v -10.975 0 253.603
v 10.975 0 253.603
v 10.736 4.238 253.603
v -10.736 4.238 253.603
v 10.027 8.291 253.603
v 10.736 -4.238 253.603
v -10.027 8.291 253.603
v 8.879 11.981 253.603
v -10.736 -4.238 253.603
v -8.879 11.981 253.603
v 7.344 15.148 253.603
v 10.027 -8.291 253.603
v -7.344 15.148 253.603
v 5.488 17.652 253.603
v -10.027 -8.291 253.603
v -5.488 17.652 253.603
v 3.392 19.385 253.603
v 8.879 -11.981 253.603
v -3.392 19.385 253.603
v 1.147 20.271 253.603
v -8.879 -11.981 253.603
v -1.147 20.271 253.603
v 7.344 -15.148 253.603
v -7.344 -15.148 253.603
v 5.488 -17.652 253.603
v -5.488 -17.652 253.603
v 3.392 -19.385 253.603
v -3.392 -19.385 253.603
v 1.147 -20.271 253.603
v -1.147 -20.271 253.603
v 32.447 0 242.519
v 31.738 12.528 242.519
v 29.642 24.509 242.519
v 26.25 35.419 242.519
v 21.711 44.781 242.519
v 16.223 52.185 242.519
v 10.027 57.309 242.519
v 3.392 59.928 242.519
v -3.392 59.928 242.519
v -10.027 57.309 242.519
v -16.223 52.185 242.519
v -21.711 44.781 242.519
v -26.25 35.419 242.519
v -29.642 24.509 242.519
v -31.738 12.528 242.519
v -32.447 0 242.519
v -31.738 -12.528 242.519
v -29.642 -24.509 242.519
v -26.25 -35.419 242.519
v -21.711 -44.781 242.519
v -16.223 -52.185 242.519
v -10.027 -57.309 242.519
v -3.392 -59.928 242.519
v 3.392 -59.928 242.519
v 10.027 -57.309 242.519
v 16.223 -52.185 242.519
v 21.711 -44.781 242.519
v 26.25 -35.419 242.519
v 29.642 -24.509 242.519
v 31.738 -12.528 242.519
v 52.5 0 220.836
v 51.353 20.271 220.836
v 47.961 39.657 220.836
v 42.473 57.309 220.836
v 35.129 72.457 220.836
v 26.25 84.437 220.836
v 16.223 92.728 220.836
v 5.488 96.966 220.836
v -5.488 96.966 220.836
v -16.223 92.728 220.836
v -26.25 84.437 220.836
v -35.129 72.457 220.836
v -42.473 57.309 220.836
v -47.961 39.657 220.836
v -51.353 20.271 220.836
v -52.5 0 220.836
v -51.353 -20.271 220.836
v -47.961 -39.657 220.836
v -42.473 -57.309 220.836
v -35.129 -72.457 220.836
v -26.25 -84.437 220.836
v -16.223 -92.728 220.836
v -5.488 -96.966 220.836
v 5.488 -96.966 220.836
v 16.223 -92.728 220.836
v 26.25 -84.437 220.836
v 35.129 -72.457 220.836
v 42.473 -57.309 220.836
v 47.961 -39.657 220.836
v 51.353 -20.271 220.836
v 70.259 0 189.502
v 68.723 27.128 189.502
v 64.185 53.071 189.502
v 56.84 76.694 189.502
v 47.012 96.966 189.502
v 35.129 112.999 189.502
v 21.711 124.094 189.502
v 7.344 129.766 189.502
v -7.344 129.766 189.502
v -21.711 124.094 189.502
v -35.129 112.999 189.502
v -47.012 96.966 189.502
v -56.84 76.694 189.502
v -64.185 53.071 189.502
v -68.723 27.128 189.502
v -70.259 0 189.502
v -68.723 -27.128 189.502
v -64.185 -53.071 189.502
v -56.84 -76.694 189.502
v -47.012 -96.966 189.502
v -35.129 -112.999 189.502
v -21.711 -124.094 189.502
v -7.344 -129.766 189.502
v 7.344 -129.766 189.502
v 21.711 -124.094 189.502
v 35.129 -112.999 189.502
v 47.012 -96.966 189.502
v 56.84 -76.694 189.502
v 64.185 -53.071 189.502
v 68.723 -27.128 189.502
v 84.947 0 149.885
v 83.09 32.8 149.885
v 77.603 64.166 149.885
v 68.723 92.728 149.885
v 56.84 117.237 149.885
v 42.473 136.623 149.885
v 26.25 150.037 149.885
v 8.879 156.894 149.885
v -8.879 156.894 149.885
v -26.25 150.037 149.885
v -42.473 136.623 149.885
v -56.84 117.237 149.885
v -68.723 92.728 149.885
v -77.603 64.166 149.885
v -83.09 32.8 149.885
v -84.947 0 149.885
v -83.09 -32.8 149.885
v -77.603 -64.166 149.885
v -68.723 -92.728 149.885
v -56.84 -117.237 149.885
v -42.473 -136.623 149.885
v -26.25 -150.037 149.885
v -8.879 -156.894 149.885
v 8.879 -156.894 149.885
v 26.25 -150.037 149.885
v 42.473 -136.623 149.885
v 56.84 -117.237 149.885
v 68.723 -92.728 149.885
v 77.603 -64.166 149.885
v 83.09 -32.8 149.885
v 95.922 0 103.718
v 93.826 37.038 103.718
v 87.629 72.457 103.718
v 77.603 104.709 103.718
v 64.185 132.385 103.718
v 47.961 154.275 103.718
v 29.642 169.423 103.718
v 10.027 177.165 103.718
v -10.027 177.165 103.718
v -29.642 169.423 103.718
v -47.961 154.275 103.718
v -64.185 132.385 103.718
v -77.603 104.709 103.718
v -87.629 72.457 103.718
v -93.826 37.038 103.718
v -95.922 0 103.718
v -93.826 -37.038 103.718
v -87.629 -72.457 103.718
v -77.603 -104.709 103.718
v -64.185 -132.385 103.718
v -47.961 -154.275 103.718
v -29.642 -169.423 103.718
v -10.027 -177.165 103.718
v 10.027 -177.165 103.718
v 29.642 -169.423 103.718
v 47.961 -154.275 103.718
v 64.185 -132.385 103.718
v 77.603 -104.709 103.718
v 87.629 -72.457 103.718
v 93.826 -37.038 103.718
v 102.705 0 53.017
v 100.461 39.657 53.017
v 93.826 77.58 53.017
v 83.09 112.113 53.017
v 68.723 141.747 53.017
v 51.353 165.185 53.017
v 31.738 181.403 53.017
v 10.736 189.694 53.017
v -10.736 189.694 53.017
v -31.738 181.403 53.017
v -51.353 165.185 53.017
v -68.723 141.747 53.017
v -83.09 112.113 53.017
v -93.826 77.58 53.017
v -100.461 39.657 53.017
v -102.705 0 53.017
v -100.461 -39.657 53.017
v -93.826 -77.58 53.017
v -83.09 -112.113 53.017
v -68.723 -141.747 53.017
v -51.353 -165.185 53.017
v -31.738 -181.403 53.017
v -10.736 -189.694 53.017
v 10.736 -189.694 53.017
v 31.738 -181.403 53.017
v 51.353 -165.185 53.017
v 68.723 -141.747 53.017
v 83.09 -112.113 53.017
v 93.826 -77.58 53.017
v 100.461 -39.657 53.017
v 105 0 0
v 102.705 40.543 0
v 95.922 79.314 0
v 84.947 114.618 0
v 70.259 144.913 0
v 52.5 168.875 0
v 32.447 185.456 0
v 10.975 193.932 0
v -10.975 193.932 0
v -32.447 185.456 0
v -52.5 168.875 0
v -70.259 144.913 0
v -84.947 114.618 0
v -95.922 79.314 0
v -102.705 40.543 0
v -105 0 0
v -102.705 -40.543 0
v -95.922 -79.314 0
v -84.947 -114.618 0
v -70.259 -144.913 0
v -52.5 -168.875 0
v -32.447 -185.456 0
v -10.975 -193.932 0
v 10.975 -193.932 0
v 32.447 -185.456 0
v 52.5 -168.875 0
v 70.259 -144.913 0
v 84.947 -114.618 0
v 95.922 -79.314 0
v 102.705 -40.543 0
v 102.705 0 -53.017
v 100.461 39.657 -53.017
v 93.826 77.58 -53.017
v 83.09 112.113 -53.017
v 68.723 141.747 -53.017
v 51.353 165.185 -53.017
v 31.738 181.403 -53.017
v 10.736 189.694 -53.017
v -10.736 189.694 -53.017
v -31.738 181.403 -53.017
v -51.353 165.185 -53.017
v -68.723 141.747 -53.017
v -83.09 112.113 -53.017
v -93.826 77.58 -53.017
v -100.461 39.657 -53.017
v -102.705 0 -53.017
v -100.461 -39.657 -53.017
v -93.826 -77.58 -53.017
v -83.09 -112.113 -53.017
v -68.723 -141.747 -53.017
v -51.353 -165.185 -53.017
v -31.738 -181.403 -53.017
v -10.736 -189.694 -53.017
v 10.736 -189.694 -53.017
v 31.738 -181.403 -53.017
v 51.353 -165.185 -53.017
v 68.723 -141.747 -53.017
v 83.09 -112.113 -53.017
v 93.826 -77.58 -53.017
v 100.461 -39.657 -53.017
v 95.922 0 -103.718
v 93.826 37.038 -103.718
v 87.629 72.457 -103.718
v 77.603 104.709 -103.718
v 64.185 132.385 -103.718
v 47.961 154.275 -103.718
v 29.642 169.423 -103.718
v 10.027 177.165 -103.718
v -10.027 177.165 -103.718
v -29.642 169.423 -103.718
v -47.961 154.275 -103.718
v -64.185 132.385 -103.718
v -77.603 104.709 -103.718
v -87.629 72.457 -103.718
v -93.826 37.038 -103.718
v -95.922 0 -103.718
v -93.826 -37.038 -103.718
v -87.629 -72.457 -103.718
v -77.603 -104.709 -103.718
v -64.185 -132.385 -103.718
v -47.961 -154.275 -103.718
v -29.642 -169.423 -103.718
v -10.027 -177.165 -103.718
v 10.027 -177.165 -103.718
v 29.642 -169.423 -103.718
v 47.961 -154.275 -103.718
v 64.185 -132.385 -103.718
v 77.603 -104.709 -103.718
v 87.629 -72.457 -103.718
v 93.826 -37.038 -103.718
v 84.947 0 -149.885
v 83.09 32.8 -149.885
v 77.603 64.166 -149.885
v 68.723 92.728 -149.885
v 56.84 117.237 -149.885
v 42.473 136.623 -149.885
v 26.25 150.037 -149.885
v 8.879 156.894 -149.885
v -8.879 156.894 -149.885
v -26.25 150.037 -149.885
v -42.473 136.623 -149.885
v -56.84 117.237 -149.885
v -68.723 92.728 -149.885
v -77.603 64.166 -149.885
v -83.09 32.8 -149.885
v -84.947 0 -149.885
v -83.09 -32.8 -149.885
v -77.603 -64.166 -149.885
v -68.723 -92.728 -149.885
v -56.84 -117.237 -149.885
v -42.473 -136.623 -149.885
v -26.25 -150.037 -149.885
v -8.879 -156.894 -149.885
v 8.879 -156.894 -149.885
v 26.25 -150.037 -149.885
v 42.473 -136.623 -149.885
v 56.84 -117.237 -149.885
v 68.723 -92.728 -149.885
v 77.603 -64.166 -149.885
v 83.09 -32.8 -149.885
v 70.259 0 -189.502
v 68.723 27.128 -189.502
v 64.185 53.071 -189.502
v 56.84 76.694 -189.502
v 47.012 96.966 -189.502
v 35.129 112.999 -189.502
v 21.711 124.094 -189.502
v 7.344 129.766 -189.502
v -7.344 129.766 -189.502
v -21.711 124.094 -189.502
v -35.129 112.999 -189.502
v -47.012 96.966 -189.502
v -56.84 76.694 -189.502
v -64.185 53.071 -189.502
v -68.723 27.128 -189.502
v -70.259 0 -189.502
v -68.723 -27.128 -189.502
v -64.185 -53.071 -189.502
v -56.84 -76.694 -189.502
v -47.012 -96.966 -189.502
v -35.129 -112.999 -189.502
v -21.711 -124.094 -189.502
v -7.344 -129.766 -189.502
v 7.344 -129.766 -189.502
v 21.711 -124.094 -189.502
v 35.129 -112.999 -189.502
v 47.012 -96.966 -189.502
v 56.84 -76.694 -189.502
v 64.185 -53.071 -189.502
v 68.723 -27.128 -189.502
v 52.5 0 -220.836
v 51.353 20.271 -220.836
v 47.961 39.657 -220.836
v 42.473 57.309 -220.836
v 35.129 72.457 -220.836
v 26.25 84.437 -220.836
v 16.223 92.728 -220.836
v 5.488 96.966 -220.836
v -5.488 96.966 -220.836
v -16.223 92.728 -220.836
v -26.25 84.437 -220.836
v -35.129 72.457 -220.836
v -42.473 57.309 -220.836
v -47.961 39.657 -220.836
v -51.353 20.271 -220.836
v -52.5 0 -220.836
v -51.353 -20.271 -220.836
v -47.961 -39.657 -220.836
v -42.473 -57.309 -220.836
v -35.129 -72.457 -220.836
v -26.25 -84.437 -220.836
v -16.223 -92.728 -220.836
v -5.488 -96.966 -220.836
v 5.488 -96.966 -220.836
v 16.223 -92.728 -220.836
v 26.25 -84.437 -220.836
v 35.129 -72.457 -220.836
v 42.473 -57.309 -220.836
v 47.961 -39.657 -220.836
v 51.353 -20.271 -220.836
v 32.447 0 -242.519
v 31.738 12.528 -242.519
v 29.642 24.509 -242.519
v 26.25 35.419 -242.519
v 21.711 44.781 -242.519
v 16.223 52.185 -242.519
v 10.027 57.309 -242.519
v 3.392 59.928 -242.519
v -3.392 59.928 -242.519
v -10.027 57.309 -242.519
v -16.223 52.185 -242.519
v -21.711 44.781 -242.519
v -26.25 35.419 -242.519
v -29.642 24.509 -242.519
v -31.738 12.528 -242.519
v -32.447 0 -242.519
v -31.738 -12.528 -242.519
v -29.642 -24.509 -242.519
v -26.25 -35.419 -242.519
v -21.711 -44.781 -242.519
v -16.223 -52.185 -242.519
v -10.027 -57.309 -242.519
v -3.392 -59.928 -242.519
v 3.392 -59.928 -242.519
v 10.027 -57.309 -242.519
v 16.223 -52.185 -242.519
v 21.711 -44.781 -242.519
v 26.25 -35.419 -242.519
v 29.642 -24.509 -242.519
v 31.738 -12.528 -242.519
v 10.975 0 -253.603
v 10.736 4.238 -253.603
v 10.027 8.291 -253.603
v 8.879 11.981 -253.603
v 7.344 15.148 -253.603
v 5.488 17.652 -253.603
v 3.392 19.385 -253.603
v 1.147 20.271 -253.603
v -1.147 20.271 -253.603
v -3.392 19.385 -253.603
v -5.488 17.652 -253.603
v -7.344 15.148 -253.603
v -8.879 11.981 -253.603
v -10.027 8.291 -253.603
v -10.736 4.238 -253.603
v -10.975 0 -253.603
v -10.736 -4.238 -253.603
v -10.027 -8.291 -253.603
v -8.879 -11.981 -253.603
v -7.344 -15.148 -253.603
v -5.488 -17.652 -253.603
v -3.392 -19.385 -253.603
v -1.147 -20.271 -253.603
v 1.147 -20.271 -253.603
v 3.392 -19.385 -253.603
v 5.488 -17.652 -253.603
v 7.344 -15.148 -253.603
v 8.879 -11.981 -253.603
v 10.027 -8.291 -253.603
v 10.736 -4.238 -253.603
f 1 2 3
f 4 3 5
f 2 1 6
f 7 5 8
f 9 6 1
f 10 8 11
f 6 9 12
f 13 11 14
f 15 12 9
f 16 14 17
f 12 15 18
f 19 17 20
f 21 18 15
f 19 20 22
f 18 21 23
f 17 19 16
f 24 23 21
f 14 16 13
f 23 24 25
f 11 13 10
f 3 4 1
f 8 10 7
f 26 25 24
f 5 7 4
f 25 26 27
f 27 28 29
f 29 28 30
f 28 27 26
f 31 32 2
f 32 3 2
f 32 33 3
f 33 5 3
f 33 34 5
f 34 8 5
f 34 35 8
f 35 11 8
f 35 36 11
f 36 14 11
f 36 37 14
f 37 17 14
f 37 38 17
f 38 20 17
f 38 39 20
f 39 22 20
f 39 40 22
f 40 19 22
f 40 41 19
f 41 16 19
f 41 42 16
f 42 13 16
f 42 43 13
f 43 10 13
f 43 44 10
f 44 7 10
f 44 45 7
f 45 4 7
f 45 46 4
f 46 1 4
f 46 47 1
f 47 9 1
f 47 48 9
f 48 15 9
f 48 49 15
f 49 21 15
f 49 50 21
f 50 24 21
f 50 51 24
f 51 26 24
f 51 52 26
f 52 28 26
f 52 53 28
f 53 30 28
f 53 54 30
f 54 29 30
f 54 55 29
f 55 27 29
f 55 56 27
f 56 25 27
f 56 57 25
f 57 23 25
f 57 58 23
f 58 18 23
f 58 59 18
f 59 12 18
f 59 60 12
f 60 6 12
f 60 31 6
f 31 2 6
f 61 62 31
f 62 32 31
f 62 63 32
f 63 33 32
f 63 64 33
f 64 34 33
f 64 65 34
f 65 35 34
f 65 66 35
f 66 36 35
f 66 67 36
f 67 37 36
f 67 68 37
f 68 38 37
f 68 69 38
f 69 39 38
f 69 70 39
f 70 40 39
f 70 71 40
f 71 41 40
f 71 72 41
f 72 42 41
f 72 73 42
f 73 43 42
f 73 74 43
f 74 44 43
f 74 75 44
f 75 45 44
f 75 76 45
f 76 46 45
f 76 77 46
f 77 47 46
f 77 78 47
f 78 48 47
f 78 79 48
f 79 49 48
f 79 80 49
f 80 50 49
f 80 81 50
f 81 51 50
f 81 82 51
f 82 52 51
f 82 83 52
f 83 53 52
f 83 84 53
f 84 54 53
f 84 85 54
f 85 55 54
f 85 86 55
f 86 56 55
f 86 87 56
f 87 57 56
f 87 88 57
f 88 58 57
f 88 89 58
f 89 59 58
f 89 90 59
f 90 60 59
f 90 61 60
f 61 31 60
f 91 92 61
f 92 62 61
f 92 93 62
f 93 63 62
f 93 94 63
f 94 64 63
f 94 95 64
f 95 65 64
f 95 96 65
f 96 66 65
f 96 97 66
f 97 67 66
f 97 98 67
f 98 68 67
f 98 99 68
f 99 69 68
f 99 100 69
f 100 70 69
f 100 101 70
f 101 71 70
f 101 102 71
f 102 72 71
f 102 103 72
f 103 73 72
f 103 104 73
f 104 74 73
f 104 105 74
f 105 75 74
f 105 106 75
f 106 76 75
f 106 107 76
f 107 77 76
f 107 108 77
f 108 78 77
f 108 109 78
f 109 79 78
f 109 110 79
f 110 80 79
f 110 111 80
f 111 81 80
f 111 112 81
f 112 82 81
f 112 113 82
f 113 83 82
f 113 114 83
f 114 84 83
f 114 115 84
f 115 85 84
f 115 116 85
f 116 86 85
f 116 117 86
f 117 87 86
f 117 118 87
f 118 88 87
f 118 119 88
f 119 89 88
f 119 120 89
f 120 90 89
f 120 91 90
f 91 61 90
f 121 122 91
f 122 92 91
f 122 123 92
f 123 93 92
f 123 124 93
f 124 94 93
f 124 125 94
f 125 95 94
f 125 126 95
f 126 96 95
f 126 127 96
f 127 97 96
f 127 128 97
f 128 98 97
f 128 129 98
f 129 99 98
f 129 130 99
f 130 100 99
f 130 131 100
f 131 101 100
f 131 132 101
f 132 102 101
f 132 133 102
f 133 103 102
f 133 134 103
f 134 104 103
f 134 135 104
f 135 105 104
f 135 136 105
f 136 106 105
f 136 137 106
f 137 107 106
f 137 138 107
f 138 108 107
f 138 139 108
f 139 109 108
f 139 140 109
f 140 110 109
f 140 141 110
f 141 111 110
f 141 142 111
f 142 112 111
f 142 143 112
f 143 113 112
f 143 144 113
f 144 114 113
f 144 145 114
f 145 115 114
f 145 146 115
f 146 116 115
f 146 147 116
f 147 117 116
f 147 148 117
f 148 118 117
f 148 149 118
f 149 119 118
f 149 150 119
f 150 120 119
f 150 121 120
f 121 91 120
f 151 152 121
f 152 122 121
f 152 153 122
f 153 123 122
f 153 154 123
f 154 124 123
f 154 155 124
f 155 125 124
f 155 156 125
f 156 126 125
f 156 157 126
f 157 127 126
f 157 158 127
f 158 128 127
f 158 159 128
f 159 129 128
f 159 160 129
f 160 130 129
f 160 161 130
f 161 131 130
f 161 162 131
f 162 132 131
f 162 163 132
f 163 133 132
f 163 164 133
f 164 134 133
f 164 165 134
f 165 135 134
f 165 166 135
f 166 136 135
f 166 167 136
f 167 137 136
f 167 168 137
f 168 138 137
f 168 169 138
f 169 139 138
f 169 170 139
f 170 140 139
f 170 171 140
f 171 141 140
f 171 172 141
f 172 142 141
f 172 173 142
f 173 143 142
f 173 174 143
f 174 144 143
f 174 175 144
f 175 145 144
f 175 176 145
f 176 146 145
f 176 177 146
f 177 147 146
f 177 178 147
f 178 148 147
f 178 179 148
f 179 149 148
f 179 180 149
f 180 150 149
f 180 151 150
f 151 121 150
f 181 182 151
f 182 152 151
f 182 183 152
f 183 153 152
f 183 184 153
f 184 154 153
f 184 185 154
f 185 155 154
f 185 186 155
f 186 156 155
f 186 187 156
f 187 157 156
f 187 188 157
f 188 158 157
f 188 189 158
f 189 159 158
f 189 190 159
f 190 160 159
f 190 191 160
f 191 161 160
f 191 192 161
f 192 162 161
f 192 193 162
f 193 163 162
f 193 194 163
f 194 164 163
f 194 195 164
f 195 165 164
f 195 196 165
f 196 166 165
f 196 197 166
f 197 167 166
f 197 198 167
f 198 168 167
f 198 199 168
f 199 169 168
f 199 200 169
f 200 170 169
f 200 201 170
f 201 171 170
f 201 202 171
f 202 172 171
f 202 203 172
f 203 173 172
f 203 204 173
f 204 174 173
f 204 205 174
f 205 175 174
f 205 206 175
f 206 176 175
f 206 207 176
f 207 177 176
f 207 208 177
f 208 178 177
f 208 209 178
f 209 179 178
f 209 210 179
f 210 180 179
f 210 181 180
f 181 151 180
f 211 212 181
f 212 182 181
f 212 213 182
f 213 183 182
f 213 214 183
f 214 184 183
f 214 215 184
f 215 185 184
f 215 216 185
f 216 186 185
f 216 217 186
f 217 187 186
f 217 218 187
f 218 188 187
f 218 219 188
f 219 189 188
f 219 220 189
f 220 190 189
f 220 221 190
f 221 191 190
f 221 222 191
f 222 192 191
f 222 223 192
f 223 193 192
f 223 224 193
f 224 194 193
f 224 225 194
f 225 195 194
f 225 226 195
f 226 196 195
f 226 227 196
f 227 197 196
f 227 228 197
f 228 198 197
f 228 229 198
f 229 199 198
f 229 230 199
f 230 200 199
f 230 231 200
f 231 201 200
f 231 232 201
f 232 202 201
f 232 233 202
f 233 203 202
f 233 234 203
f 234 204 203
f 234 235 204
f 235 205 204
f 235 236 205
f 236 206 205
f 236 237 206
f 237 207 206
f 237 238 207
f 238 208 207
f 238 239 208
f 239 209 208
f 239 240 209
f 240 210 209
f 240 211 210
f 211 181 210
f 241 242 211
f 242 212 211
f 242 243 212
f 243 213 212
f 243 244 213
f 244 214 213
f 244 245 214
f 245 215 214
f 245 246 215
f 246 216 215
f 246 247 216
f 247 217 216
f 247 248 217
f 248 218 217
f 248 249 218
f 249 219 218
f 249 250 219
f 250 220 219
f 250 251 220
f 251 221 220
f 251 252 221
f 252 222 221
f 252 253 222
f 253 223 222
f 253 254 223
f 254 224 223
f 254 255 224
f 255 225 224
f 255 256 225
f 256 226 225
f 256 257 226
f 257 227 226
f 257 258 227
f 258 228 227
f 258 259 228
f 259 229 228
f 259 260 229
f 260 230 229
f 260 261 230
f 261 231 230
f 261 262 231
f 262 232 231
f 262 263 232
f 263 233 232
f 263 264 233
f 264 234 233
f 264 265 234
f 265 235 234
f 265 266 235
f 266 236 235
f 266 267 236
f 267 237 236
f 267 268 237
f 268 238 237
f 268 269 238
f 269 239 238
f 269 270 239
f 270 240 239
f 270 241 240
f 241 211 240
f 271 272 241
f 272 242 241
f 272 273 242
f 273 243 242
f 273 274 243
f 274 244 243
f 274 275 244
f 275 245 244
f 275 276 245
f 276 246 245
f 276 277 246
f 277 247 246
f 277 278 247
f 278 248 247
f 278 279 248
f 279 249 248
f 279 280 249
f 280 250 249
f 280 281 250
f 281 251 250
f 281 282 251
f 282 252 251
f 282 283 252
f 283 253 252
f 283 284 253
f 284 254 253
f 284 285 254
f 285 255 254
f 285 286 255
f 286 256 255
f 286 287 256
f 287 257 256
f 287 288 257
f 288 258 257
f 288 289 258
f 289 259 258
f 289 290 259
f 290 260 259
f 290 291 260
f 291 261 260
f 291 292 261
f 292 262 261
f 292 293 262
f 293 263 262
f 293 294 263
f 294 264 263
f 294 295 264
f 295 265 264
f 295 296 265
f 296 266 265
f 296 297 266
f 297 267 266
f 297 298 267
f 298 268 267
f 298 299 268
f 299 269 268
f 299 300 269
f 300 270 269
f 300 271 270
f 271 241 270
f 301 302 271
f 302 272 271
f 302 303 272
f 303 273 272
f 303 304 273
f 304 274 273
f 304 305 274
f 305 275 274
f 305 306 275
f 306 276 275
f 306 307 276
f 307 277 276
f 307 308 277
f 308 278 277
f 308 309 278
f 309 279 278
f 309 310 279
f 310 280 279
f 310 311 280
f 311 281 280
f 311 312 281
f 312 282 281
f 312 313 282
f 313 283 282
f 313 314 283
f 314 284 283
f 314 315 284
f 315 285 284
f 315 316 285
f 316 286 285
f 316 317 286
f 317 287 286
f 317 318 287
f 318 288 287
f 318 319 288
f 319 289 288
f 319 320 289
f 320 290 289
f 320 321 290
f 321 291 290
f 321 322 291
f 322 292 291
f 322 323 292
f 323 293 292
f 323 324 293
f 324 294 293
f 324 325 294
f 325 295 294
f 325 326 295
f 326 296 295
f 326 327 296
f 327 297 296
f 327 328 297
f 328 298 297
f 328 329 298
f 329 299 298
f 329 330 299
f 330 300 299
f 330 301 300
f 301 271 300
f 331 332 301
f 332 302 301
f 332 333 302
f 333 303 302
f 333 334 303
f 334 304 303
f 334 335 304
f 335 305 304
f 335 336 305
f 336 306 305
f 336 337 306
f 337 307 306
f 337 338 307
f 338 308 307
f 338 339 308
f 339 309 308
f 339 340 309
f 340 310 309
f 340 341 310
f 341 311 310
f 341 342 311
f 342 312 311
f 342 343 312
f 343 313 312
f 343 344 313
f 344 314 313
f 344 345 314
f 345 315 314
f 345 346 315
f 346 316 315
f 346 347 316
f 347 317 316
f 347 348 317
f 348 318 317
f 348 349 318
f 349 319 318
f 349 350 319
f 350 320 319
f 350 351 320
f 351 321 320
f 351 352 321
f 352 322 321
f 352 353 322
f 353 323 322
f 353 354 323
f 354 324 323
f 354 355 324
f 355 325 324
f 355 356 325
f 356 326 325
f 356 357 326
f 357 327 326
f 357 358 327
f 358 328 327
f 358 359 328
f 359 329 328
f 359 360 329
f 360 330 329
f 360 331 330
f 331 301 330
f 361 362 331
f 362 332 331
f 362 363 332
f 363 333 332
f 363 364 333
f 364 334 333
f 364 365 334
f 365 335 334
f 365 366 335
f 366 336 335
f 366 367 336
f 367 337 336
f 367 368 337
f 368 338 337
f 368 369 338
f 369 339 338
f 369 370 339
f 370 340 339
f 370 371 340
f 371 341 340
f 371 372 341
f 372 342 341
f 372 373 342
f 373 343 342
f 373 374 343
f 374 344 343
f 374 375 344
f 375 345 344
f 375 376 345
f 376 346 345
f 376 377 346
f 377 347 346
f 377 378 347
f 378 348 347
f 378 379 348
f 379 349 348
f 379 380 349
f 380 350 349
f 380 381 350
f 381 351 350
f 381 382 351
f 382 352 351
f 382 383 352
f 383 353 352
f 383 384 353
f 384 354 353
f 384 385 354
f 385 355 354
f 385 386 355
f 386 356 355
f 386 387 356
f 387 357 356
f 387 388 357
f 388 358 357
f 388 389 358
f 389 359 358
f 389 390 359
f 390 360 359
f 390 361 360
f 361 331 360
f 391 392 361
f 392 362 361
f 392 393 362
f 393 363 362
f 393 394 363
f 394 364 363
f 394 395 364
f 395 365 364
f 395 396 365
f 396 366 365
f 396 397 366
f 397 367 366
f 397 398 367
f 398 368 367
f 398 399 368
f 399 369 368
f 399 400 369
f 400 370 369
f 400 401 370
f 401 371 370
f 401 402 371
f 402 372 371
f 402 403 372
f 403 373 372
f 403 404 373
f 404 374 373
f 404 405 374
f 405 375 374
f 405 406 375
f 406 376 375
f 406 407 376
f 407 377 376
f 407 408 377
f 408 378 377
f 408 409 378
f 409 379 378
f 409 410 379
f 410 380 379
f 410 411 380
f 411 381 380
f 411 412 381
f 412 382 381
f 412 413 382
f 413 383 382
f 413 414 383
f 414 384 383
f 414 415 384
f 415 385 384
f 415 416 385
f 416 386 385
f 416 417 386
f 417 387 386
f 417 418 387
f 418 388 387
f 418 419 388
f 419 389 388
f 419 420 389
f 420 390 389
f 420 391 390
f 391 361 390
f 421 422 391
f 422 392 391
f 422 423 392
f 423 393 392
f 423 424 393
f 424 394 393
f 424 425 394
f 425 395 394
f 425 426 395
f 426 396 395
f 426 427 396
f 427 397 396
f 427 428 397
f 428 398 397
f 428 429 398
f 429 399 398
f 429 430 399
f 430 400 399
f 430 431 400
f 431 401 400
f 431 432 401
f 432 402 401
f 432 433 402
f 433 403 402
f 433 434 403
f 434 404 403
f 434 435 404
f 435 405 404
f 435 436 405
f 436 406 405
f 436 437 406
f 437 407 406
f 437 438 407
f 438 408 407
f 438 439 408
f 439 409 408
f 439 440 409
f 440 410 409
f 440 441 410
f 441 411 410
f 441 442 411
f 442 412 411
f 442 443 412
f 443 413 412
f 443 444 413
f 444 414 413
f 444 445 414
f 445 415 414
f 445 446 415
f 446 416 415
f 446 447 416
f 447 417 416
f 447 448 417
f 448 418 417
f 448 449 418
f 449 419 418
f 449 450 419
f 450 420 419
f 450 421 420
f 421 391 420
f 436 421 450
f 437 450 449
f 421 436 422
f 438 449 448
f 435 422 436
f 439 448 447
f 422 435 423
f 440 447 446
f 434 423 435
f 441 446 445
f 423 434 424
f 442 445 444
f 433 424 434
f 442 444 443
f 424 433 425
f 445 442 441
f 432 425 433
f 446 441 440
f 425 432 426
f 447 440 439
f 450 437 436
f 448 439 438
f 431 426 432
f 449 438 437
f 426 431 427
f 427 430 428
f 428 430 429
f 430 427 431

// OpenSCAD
// Generated by SolidPython 1.0.1 on 2020-07-29 00:46:47


scale(v = [7, 13, 17]) {
	sphere(r = 15);
}
/***********************************************
*********      SolidPython code:      **********
************************************************
 
# import packages: SolidPython
from solid import *
from solid.utils import *
from itertools import chain, combinations, permutations


class Resize:

    def __init__(self, scad_file):
        self.scad_file = scad_file
        #self.scad_file = import_scad(scad_file)
        # cone/cylinder param:
        self.r1 = 0
        self.r2 = 0
        self.h = 0
        # rectangular prism param:
        self.w = 0
        self.l = 0
        # ellipse param:
        self.r = 0

    # import OpenScad code (file name corresponds to shape)


    # classify shape + parameters
    def assign(self, param1, param2, param3):
        if self.scad_file == 'cone.scad':
            self.r1 = param1
            self.r2 = param2
            self.h = param3
        elif self.scad_file == 'cylinder.scad':
            self.r1 = param1
            self.r2 = param2
            self.h = param3
        elif self.scad_file == 'rectangularPrism.scad':
            self.h = param1
            self.l = param2
            self.w = param3
        else:
            self.r = param1
            self.h = param2

    # resize parameters
    def iterate(self):
        x = range(3, 20, 2)
        i = 1
        if self.scad_file == 'cone.scad':
            tempList = list(permutations(x, 2))
            for temp in tempList:
                param1 = temp[0]
                param2 = temp[1]
                filepath = 'produced_scad_files/' + 'cone' + str(param1) + '_' + str(param2) + '_' + '.scad'
                scad_render_to_file(cylinder(h=param1, r1=param2, r2=0), filepath)

        elif self.scad_file == 'cylinder.scad':
            tempList = list(permutations(x, 3))
            for temp in tempList:
                param1 = temp[0]
                param2 = temp[1]
                filepath = 'produced_scad_files/' + 'cylinder' + str(param1) + '_' + str(param2) + '_' + '.scad'
                scad_render_to_file(cylinder(h=param1, r1=param2, r2=param2), filepath)

        elif self.scad_file == 'rectangularPrism.scad':
            tempList = list(permutations(x, 3))
            for temp in tempList:
                param1 = temp[0]
                param2 = temp[1]
                param3 = temp[2]
                filepath = 'produced_scad_files/' + 'rectangularPrism' + str(param1) + '_' + str(param2) + '_' + str(
                    param3) + '.scad'
                scad_render_to_file(cube(size=(param1, param2, param3)), filepath)

        elif self.scad_file == 'ellipse.scad':
            tempList = list(permutations(x, 4))
            for temp in tempList:
                param1 = temp[0]
                param2 = temp[1]
                param3 = temp[2]
                param4 = temp[3]
                filepath = 'produced_scad_files/' + 'ellipse' + str(param1) + '_' + str(param2) + '_' + str(param3) + '_' + str(param4) + '.scad'
                scad_render_to_file(scale([param1, param2, param3])(sphere(r=param4)), filepath)

    def render_to_scadfile(self):
        scad_render_to_file(scad, 'example.scad') 
 
************************************************/
